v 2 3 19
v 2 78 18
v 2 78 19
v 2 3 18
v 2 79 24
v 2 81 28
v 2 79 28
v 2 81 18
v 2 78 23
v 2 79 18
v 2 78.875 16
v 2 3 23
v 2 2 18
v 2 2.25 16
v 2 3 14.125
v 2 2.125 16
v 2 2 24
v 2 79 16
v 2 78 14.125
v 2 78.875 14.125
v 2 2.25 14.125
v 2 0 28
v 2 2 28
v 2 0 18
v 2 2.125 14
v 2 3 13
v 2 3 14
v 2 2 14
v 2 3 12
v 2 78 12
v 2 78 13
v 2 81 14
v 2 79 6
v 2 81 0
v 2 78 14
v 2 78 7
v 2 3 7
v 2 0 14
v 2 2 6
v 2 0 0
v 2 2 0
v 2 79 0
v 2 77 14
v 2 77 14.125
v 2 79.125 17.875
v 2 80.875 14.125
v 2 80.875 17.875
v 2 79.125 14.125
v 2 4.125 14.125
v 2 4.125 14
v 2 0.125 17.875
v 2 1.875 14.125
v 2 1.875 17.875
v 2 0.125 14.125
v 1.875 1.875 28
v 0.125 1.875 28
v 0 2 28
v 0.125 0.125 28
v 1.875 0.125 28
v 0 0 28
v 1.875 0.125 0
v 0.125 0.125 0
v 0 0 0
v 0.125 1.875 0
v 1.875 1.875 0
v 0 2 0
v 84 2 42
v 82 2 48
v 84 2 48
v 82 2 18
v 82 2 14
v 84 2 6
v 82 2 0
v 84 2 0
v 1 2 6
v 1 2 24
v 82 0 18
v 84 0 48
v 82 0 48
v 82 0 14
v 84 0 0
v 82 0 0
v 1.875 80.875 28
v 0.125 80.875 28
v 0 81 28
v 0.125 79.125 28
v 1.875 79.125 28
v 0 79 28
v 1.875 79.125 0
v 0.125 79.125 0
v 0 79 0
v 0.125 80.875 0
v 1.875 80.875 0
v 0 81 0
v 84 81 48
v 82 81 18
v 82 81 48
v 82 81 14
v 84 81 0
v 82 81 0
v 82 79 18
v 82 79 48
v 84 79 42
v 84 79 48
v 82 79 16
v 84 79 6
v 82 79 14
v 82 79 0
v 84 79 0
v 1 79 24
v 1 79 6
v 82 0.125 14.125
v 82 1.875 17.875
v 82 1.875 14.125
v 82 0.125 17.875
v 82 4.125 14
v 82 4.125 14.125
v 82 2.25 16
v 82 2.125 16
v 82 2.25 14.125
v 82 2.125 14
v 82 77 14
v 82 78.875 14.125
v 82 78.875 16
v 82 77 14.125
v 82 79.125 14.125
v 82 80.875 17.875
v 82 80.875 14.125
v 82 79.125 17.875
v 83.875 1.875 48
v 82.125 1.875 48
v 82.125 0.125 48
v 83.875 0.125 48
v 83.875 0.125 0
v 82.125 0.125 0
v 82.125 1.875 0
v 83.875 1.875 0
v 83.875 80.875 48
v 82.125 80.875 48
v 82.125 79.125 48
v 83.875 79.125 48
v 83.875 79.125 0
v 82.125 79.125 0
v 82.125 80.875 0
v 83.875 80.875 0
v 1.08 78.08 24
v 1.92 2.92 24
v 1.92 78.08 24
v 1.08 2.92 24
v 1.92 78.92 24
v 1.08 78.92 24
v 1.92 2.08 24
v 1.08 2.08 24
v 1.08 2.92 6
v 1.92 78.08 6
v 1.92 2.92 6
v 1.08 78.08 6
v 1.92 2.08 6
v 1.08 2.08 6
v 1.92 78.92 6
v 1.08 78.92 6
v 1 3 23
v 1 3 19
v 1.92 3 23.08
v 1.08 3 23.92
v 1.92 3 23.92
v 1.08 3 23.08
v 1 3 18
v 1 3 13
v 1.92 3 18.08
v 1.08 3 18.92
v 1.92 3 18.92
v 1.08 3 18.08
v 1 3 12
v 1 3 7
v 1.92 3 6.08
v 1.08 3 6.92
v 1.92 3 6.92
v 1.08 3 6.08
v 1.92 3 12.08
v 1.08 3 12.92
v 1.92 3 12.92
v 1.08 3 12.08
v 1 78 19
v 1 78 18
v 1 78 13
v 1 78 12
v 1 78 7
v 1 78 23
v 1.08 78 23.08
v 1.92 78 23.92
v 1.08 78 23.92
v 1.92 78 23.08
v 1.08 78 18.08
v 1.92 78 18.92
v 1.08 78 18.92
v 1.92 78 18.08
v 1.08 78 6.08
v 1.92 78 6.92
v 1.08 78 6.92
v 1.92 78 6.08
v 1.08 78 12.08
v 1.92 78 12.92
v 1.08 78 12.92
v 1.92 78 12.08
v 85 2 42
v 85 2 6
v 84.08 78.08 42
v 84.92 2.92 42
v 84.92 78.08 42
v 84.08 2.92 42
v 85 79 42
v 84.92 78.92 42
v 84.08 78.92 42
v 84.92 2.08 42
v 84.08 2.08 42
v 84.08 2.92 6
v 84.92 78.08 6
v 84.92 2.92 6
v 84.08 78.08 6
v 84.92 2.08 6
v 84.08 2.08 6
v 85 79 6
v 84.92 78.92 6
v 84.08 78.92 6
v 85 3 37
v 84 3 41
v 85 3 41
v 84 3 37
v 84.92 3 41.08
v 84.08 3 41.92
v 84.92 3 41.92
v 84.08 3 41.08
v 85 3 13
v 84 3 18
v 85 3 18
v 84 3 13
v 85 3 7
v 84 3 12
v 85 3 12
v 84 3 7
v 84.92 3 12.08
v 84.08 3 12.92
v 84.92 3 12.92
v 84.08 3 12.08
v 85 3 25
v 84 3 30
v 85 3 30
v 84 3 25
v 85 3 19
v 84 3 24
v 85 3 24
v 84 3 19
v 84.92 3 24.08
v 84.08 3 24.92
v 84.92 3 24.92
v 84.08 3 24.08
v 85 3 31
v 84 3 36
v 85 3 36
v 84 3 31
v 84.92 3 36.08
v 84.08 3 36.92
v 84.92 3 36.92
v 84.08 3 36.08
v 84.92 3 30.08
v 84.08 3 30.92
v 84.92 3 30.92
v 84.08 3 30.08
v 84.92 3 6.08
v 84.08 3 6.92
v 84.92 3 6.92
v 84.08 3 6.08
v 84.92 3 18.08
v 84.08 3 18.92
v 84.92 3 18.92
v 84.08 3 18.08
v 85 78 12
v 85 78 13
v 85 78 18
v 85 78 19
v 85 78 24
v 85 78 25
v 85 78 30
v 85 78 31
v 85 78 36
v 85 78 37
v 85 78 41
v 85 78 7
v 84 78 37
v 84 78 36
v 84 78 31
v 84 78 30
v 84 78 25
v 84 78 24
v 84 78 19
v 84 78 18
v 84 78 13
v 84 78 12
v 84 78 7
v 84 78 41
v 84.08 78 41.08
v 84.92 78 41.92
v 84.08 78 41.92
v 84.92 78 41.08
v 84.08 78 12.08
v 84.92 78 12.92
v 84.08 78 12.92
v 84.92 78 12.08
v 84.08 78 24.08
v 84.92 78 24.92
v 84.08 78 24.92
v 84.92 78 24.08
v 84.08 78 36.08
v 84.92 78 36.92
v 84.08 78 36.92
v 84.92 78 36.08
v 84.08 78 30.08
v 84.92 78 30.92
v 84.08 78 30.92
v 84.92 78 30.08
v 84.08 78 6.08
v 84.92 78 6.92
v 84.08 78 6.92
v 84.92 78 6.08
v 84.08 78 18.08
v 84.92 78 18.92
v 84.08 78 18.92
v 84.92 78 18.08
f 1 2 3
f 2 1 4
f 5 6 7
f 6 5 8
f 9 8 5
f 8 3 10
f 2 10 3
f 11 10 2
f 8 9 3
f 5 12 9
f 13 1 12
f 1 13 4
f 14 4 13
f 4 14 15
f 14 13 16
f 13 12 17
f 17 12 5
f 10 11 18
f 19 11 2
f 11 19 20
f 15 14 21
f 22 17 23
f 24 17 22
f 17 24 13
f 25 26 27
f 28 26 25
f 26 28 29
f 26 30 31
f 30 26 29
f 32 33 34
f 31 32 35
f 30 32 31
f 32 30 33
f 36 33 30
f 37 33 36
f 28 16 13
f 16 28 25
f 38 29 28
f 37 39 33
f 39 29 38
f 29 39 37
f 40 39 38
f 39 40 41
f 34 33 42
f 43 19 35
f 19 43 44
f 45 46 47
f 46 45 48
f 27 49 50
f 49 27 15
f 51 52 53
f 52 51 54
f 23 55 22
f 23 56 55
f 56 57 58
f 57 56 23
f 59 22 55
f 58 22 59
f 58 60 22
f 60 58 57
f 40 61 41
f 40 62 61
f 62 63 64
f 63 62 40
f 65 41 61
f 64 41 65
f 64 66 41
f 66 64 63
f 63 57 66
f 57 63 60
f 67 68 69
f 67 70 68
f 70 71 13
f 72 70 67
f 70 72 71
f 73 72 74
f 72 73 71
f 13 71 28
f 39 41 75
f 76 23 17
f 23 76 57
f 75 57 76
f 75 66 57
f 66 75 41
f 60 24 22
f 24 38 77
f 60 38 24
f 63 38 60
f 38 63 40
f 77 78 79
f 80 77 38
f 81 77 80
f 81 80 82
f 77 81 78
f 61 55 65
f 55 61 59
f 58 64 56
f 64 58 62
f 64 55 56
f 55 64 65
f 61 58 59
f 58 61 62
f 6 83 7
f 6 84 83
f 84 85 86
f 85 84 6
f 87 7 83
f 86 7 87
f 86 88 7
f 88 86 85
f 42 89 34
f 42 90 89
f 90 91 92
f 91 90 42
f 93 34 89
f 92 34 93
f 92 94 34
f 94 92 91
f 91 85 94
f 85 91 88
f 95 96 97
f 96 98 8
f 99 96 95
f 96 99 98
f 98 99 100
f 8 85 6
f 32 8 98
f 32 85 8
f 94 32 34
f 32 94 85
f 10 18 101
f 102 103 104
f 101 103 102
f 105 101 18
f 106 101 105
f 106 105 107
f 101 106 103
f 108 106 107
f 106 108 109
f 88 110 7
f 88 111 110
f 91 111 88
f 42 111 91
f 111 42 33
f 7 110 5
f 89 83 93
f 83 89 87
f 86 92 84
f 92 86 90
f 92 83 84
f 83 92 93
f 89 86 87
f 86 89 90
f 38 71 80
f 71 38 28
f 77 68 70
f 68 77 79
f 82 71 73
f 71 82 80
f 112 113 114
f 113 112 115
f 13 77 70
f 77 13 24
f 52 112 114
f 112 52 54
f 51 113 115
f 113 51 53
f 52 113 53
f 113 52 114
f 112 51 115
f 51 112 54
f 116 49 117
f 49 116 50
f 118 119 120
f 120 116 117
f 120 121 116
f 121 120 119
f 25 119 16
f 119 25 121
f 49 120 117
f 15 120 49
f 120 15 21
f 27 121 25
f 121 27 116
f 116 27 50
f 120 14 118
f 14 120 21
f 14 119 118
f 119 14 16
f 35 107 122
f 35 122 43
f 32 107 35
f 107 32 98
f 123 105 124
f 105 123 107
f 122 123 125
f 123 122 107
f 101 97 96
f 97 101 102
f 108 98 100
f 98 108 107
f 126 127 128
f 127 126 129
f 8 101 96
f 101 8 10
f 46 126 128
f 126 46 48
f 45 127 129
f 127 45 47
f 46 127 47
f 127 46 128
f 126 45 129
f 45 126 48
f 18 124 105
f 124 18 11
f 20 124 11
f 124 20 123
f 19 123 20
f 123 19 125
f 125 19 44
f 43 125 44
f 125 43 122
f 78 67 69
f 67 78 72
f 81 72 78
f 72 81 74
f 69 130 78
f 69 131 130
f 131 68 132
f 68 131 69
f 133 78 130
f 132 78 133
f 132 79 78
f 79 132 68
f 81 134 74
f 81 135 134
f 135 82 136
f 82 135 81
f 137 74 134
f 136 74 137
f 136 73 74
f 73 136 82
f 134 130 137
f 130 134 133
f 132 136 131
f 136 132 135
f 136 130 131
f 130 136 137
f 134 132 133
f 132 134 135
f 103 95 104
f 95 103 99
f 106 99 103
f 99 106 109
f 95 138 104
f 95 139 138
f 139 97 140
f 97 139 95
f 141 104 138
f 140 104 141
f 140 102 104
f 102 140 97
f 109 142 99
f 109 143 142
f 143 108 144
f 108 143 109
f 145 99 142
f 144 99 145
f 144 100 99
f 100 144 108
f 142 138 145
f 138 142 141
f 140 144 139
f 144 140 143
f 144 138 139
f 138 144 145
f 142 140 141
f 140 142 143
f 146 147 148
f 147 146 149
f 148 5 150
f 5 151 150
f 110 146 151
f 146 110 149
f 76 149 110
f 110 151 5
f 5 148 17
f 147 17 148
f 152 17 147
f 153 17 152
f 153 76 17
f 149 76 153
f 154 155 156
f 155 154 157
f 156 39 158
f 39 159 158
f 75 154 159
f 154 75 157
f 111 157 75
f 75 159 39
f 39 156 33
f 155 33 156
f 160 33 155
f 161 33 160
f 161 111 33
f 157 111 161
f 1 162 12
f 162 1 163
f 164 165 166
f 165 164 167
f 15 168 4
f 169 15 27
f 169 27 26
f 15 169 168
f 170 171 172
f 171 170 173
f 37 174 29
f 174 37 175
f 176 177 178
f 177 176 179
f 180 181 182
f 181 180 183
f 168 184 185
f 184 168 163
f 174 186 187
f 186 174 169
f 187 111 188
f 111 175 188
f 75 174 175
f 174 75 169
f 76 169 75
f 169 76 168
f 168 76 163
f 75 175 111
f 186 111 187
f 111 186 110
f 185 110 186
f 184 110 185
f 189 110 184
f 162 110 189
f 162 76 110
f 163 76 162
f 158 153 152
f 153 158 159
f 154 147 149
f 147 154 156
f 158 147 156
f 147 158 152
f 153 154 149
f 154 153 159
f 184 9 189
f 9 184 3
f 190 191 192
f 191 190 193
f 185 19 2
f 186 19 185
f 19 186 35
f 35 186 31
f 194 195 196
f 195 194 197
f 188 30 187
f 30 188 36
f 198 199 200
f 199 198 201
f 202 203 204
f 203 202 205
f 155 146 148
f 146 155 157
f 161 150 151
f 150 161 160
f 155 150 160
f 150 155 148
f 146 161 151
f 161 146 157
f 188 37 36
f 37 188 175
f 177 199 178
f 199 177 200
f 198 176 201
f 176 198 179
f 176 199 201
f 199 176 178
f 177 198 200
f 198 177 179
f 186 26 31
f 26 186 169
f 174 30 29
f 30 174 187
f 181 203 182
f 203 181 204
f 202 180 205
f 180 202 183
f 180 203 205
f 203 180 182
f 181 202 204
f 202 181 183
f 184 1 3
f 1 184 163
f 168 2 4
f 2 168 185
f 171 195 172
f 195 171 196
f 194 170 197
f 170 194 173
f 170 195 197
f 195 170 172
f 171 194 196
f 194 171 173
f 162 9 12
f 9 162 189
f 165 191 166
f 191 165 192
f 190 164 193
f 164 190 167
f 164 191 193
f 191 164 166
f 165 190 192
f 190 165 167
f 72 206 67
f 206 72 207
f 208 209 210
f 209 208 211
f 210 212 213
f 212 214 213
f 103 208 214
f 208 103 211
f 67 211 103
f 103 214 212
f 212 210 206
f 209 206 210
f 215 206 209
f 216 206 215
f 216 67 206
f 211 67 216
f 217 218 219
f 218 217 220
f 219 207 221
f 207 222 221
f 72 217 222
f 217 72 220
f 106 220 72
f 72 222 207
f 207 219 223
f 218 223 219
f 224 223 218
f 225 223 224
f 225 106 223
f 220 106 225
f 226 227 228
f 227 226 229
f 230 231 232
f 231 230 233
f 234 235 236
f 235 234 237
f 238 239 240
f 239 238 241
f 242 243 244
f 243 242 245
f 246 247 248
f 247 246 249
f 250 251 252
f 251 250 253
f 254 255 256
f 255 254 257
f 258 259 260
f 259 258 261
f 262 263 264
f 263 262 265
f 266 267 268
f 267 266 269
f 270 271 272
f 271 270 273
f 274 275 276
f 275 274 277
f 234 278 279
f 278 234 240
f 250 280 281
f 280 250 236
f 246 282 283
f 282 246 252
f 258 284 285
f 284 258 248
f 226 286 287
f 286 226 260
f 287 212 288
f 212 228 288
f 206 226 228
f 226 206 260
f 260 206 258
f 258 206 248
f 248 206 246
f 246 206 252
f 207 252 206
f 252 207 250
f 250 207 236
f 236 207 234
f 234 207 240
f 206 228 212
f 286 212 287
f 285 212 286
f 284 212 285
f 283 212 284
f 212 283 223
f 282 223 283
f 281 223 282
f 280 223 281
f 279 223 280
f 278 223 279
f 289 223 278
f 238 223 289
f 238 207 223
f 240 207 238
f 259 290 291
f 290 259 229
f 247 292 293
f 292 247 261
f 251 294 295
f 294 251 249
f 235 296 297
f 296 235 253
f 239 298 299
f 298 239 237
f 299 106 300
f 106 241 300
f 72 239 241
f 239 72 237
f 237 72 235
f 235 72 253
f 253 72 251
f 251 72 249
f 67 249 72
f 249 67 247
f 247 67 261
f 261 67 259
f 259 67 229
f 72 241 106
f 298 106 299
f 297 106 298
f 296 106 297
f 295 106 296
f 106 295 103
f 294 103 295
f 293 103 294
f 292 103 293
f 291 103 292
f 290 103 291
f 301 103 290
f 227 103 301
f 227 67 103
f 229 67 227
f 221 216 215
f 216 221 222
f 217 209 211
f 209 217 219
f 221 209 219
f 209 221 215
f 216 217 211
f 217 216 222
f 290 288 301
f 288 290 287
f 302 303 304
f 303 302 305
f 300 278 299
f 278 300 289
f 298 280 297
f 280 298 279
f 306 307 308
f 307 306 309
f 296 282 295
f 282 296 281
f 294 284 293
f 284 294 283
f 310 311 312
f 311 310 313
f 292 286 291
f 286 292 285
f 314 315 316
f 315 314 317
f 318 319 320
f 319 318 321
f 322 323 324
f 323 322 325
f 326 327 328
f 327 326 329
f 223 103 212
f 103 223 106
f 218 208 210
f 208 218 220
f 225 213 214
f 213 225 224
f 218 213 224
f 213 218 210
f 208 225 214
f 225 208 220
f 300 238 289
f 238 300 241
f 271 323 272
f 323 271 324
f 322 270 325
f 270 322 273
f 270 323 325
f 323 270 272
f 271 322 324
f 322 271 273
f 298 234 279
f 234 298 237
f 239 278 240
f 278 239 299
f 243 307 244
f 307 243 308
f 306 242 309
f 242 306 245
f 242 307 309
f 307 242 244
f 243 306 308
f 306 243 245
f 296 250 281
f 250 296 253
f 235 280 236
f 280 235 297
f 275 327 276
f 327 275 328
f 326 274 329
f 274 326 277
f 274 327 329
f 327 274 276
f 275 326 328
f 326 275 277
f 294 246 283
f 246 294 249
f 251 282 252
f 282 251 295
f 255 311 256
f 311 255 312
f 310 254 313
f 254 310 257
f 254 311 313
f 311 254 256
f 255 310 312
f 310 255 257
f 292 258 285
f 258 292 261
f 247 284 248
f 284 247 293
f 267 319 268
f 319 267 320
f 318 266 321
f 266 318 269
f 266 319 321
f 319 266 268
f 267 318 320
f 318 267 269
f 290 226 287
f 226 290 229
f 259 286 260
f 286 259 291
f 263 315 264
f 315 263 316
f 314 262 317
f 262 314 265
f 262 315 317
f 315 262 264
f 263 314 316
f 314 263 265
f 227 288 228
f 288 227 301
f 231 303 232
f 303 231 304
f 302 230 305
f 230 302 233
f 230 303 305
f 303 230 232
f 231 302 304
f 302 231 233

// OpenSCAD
// file: parts.scad
module rectangularTube(height, width, length, thickness) {
    difference()
    {
        cube([height, width, length]);
        // Ensure the inside sticks out a bit more to avoid clipping
        translate([thickness, thickness, -1]) {
            cube([height - 2*thickness, width - 2*thickness, length+2]);
        };
    }
};

module angleIron(height, width, length, thickness) {
    union()
    {
        cube([height, thickness, length]);
        rotate([0, -90, 0]) {
            translate([0, 0, -1 * thickness]) {
                cube([length, width, thickness]);
            }
        }
    }
}

module circularTube(outer, thickness, length) {
    outerRadius = outer / 2;
    innerRadius = outerRadius - thickness;
    difference() {
        cylinder(length, outerRadius, outerRadius, $fn=32);
        // Ensure the inside sticks out a bit more to avoid clipping
        translate([0, 0, -1]) {
            cylinder(length + 2, innerRadius, innerRadius, $fn=32);
        }
    }

}

module sheet(width, length, thickness) {
    cube([width, length, thickness]);
}

module circularBar(diameter, length) {
        cylinder(h=length, r1=diameter/2, r2=diameter/2, $fn=32);
}

module flatBar(thickness, width, length) {
    cube([width, length, thickness]);
}

module perforatedPlate(length, width, thickness, holeSize, holeSpacing) {
    radius = holeSize / 2;
    difference() {
        cube([length, width, thickness]);
        for( x = [ 0:holeSpacing:length ] ) {
            for ( y = [ 0:holeSpacing:width ]){
                translate([x, y, 0]){
                    cylinder( thickness*10 , radius, radius, $fn=32, center=true) ;
                }
            }
        }
    }
}


rectangularTube(4, 4, 12, .25);

translate([ 10, 0, 0]) {
    angleIron( 4, 4, 12, .25);
}

translate([ 22, 2, 0]) {
    circularTube(4, .25, 12);
}

translate([ 30, 0, 0]) {
    rotate([90, 0, 0]) {
        flatBar(.25, 4, 12);
    }
}

translate([ 40, 2, 0]) {
    circularBar(4, 12);
}

translate([ 50, 0, 0]) {
    rotate([270, 270, 0]) perforatedPlate(12, 6, .036, .067, .5);
}

translate([ 60, 0, 0]) {
    rotate([270, 270, 0]) sheet( 10, 10, .125 );
}
// main file
use <parts.scad>;

mattressLength=80;
mattressWidth=76;
bedHeight = 18;
structualHeight = 4;
structualWidth = 2;
postSize = 2;
centerOffset = (postSize - structualWidth) /2;
bedLength = mattressLength + 2* structualWidth;
siderailLength = bedLength - 2*structualWidth;
crossLength = mattressWidth + 1;
headboardHeight = 48;
footboardHeightOffGround = 6;
footboardLegHeight = bedHeight + 10 ;
footboardPanelHeight = 18;
footboardNumCrossPieces = 3;
headboardHeightOffGround = 6;
headboardPanelHeight = 36;
headboardNumCrossPieces = 6;
squaretube_size = 1;

angleIronThickness = .125;

numPostTubes = 0;

// Structual members
module structuralTube(length) {
    color("grey")
    rectangularTube(structualHeight, structualWidth, length, .125);
}

module postTube(length) {
    color("grey")
    rectangularTube(postSize, postSize, length, .125);
}

module supportLedge(length) {
    angleIron(2, 2, length, angleIronThickness);
}

module crossrail() {
    structuralTube( crossLength - postSize);
}

module woodPanel(x, y, z) {
    color("brown")
    cube([x, y, z]);
}

module mattress() {
    color("white")
    cube([ mattressLength, mattressWidth, 12 ]);
}

module footboard() {
    // structuralTube(20);
    rotate([0, 90, 0]) {

      translate([- squaretube_size, squaretube_size, footboardHeightOffGround]) {
        rectangularTube(squaretube_size, squaretube_size, footboardPanelHeight, .08);
      }
      translate([-1*  crossLength  , squaretube_size, footboardHeightOffGround]) {
        rectangularTube(squaretube_size, squaretube_size, footboardPanelHeight, .08);
      }
      rotate([0, -90, 0]) {

        footboard_crosspiece_spacing = footboardPanelHeight / footboardNumCrossPieces;

        for ( i = [0 : footboardNumCrossPieces - 1] ){
          translate([footboardHeightOffGround + i * footboard_crosspiece_spacing, squaretube_size, squaretube_size]) {
            rectangularTube(squaretube_size, squaretube_size, crossLength - 2* squaretube_size, .08);
          }
        }
        // Top piece of the footboard
        translate([footboardHeightOffGround + footboardPanelHeight - squaretube_size, squaretube_size, squaretube_size]) {
          rectangularTube(squaretube_size, squaretube_size, crossLength - 2* squaretube_size, .08);
        }
      }
    }
}

module headboard() {
    // structuralTube(20);
    rotate([0, 90, 0]) {

      translate([- squaretube_size, squaretube_size, headboardHeightOffGround]) {
        rectangularTube(squaretube_size, squaretube_size, headboardPanelHeight, .08);
      }
      translate([-1*  crossLength  , squaretube_size, headboardHeightOffGround]) {
        rectangularTube(squaretube_size, squaretube_size, headboardPanelHeight, .08);
      }
      rotate([0, -90, 0]) {

        headboard_crosspiece_spacing = headboardPanelHeight / headboardNumCrossPieces;

        for ( i = [0 : headboardNumCrossPieces - 1] ){
          translate([headboardHeightOffGround + i * headboard_crosspiece_spacing, squaretube_size, squaretube_size]) {
            rectangularTube(squaretube_size, squaretube_size, crossLength - 2* squaretube_size, .08);
          }
        }
        // Top piece of the headboard
        translate([headboardHeightOffGround + headboardPanelHeight - squaretube_size, squaretube_size, squaretube_size]) {
          rectangularTube(squaretube_size, squaretube_size, crossLength - 2* squaretube_size, .08);
        }
      }
    }
}

//
// Bed design
//

// Footboard legs
postTube(footboardLegHeight);

translate([ 0, crossLength + postSize, 0 ]) {
    postTube(footboardLegHeight);
}


// Siderails
rotate([ 0, 90, 0 ]) {
    translate([ -1 * bedHeight, centerOffset, , postSize]) {
        structuralTube( siderailLength );
        translate([ structualHeight, structualWidth + .125, 0]) {
            rotate([0, 0, 90]) {
                supportLedge( siderailLength );
            }
        }

        translate([ 0, crossLength + postSize, 0 ]) {
            structuralTube(siderailLength);
            translate([structualHeight, 0, 0]) {
                rotate([0, 0, 180]) {
                    supportLedge( siderailLength );
                }
            }
        }
    }
}

// Headboard legs
translate([ siderailLength + structualWidth, 0, 0 ]) {
    postTube(headboardHeight);

    translate([ 0, crossLength + postSize, 0 ]) {
        postTube( headboardHeight);
    }
}

// Mattress

translate([ structualWidth, structualWidth + 8*angleIronThickness, bedHeight - structualHeight + angleIronThickness]){
   //mattress();
}


translate([ 0, structualWidth, 0]) {
  rotate([ 0, 270, 270 ]) {
    footboard();
  }
}

translate([ bedLength - squaretube_size, structualWidth, 0]) {
  rotate([ 0, 270, 270 ]) {
    headboard();
  }
}
